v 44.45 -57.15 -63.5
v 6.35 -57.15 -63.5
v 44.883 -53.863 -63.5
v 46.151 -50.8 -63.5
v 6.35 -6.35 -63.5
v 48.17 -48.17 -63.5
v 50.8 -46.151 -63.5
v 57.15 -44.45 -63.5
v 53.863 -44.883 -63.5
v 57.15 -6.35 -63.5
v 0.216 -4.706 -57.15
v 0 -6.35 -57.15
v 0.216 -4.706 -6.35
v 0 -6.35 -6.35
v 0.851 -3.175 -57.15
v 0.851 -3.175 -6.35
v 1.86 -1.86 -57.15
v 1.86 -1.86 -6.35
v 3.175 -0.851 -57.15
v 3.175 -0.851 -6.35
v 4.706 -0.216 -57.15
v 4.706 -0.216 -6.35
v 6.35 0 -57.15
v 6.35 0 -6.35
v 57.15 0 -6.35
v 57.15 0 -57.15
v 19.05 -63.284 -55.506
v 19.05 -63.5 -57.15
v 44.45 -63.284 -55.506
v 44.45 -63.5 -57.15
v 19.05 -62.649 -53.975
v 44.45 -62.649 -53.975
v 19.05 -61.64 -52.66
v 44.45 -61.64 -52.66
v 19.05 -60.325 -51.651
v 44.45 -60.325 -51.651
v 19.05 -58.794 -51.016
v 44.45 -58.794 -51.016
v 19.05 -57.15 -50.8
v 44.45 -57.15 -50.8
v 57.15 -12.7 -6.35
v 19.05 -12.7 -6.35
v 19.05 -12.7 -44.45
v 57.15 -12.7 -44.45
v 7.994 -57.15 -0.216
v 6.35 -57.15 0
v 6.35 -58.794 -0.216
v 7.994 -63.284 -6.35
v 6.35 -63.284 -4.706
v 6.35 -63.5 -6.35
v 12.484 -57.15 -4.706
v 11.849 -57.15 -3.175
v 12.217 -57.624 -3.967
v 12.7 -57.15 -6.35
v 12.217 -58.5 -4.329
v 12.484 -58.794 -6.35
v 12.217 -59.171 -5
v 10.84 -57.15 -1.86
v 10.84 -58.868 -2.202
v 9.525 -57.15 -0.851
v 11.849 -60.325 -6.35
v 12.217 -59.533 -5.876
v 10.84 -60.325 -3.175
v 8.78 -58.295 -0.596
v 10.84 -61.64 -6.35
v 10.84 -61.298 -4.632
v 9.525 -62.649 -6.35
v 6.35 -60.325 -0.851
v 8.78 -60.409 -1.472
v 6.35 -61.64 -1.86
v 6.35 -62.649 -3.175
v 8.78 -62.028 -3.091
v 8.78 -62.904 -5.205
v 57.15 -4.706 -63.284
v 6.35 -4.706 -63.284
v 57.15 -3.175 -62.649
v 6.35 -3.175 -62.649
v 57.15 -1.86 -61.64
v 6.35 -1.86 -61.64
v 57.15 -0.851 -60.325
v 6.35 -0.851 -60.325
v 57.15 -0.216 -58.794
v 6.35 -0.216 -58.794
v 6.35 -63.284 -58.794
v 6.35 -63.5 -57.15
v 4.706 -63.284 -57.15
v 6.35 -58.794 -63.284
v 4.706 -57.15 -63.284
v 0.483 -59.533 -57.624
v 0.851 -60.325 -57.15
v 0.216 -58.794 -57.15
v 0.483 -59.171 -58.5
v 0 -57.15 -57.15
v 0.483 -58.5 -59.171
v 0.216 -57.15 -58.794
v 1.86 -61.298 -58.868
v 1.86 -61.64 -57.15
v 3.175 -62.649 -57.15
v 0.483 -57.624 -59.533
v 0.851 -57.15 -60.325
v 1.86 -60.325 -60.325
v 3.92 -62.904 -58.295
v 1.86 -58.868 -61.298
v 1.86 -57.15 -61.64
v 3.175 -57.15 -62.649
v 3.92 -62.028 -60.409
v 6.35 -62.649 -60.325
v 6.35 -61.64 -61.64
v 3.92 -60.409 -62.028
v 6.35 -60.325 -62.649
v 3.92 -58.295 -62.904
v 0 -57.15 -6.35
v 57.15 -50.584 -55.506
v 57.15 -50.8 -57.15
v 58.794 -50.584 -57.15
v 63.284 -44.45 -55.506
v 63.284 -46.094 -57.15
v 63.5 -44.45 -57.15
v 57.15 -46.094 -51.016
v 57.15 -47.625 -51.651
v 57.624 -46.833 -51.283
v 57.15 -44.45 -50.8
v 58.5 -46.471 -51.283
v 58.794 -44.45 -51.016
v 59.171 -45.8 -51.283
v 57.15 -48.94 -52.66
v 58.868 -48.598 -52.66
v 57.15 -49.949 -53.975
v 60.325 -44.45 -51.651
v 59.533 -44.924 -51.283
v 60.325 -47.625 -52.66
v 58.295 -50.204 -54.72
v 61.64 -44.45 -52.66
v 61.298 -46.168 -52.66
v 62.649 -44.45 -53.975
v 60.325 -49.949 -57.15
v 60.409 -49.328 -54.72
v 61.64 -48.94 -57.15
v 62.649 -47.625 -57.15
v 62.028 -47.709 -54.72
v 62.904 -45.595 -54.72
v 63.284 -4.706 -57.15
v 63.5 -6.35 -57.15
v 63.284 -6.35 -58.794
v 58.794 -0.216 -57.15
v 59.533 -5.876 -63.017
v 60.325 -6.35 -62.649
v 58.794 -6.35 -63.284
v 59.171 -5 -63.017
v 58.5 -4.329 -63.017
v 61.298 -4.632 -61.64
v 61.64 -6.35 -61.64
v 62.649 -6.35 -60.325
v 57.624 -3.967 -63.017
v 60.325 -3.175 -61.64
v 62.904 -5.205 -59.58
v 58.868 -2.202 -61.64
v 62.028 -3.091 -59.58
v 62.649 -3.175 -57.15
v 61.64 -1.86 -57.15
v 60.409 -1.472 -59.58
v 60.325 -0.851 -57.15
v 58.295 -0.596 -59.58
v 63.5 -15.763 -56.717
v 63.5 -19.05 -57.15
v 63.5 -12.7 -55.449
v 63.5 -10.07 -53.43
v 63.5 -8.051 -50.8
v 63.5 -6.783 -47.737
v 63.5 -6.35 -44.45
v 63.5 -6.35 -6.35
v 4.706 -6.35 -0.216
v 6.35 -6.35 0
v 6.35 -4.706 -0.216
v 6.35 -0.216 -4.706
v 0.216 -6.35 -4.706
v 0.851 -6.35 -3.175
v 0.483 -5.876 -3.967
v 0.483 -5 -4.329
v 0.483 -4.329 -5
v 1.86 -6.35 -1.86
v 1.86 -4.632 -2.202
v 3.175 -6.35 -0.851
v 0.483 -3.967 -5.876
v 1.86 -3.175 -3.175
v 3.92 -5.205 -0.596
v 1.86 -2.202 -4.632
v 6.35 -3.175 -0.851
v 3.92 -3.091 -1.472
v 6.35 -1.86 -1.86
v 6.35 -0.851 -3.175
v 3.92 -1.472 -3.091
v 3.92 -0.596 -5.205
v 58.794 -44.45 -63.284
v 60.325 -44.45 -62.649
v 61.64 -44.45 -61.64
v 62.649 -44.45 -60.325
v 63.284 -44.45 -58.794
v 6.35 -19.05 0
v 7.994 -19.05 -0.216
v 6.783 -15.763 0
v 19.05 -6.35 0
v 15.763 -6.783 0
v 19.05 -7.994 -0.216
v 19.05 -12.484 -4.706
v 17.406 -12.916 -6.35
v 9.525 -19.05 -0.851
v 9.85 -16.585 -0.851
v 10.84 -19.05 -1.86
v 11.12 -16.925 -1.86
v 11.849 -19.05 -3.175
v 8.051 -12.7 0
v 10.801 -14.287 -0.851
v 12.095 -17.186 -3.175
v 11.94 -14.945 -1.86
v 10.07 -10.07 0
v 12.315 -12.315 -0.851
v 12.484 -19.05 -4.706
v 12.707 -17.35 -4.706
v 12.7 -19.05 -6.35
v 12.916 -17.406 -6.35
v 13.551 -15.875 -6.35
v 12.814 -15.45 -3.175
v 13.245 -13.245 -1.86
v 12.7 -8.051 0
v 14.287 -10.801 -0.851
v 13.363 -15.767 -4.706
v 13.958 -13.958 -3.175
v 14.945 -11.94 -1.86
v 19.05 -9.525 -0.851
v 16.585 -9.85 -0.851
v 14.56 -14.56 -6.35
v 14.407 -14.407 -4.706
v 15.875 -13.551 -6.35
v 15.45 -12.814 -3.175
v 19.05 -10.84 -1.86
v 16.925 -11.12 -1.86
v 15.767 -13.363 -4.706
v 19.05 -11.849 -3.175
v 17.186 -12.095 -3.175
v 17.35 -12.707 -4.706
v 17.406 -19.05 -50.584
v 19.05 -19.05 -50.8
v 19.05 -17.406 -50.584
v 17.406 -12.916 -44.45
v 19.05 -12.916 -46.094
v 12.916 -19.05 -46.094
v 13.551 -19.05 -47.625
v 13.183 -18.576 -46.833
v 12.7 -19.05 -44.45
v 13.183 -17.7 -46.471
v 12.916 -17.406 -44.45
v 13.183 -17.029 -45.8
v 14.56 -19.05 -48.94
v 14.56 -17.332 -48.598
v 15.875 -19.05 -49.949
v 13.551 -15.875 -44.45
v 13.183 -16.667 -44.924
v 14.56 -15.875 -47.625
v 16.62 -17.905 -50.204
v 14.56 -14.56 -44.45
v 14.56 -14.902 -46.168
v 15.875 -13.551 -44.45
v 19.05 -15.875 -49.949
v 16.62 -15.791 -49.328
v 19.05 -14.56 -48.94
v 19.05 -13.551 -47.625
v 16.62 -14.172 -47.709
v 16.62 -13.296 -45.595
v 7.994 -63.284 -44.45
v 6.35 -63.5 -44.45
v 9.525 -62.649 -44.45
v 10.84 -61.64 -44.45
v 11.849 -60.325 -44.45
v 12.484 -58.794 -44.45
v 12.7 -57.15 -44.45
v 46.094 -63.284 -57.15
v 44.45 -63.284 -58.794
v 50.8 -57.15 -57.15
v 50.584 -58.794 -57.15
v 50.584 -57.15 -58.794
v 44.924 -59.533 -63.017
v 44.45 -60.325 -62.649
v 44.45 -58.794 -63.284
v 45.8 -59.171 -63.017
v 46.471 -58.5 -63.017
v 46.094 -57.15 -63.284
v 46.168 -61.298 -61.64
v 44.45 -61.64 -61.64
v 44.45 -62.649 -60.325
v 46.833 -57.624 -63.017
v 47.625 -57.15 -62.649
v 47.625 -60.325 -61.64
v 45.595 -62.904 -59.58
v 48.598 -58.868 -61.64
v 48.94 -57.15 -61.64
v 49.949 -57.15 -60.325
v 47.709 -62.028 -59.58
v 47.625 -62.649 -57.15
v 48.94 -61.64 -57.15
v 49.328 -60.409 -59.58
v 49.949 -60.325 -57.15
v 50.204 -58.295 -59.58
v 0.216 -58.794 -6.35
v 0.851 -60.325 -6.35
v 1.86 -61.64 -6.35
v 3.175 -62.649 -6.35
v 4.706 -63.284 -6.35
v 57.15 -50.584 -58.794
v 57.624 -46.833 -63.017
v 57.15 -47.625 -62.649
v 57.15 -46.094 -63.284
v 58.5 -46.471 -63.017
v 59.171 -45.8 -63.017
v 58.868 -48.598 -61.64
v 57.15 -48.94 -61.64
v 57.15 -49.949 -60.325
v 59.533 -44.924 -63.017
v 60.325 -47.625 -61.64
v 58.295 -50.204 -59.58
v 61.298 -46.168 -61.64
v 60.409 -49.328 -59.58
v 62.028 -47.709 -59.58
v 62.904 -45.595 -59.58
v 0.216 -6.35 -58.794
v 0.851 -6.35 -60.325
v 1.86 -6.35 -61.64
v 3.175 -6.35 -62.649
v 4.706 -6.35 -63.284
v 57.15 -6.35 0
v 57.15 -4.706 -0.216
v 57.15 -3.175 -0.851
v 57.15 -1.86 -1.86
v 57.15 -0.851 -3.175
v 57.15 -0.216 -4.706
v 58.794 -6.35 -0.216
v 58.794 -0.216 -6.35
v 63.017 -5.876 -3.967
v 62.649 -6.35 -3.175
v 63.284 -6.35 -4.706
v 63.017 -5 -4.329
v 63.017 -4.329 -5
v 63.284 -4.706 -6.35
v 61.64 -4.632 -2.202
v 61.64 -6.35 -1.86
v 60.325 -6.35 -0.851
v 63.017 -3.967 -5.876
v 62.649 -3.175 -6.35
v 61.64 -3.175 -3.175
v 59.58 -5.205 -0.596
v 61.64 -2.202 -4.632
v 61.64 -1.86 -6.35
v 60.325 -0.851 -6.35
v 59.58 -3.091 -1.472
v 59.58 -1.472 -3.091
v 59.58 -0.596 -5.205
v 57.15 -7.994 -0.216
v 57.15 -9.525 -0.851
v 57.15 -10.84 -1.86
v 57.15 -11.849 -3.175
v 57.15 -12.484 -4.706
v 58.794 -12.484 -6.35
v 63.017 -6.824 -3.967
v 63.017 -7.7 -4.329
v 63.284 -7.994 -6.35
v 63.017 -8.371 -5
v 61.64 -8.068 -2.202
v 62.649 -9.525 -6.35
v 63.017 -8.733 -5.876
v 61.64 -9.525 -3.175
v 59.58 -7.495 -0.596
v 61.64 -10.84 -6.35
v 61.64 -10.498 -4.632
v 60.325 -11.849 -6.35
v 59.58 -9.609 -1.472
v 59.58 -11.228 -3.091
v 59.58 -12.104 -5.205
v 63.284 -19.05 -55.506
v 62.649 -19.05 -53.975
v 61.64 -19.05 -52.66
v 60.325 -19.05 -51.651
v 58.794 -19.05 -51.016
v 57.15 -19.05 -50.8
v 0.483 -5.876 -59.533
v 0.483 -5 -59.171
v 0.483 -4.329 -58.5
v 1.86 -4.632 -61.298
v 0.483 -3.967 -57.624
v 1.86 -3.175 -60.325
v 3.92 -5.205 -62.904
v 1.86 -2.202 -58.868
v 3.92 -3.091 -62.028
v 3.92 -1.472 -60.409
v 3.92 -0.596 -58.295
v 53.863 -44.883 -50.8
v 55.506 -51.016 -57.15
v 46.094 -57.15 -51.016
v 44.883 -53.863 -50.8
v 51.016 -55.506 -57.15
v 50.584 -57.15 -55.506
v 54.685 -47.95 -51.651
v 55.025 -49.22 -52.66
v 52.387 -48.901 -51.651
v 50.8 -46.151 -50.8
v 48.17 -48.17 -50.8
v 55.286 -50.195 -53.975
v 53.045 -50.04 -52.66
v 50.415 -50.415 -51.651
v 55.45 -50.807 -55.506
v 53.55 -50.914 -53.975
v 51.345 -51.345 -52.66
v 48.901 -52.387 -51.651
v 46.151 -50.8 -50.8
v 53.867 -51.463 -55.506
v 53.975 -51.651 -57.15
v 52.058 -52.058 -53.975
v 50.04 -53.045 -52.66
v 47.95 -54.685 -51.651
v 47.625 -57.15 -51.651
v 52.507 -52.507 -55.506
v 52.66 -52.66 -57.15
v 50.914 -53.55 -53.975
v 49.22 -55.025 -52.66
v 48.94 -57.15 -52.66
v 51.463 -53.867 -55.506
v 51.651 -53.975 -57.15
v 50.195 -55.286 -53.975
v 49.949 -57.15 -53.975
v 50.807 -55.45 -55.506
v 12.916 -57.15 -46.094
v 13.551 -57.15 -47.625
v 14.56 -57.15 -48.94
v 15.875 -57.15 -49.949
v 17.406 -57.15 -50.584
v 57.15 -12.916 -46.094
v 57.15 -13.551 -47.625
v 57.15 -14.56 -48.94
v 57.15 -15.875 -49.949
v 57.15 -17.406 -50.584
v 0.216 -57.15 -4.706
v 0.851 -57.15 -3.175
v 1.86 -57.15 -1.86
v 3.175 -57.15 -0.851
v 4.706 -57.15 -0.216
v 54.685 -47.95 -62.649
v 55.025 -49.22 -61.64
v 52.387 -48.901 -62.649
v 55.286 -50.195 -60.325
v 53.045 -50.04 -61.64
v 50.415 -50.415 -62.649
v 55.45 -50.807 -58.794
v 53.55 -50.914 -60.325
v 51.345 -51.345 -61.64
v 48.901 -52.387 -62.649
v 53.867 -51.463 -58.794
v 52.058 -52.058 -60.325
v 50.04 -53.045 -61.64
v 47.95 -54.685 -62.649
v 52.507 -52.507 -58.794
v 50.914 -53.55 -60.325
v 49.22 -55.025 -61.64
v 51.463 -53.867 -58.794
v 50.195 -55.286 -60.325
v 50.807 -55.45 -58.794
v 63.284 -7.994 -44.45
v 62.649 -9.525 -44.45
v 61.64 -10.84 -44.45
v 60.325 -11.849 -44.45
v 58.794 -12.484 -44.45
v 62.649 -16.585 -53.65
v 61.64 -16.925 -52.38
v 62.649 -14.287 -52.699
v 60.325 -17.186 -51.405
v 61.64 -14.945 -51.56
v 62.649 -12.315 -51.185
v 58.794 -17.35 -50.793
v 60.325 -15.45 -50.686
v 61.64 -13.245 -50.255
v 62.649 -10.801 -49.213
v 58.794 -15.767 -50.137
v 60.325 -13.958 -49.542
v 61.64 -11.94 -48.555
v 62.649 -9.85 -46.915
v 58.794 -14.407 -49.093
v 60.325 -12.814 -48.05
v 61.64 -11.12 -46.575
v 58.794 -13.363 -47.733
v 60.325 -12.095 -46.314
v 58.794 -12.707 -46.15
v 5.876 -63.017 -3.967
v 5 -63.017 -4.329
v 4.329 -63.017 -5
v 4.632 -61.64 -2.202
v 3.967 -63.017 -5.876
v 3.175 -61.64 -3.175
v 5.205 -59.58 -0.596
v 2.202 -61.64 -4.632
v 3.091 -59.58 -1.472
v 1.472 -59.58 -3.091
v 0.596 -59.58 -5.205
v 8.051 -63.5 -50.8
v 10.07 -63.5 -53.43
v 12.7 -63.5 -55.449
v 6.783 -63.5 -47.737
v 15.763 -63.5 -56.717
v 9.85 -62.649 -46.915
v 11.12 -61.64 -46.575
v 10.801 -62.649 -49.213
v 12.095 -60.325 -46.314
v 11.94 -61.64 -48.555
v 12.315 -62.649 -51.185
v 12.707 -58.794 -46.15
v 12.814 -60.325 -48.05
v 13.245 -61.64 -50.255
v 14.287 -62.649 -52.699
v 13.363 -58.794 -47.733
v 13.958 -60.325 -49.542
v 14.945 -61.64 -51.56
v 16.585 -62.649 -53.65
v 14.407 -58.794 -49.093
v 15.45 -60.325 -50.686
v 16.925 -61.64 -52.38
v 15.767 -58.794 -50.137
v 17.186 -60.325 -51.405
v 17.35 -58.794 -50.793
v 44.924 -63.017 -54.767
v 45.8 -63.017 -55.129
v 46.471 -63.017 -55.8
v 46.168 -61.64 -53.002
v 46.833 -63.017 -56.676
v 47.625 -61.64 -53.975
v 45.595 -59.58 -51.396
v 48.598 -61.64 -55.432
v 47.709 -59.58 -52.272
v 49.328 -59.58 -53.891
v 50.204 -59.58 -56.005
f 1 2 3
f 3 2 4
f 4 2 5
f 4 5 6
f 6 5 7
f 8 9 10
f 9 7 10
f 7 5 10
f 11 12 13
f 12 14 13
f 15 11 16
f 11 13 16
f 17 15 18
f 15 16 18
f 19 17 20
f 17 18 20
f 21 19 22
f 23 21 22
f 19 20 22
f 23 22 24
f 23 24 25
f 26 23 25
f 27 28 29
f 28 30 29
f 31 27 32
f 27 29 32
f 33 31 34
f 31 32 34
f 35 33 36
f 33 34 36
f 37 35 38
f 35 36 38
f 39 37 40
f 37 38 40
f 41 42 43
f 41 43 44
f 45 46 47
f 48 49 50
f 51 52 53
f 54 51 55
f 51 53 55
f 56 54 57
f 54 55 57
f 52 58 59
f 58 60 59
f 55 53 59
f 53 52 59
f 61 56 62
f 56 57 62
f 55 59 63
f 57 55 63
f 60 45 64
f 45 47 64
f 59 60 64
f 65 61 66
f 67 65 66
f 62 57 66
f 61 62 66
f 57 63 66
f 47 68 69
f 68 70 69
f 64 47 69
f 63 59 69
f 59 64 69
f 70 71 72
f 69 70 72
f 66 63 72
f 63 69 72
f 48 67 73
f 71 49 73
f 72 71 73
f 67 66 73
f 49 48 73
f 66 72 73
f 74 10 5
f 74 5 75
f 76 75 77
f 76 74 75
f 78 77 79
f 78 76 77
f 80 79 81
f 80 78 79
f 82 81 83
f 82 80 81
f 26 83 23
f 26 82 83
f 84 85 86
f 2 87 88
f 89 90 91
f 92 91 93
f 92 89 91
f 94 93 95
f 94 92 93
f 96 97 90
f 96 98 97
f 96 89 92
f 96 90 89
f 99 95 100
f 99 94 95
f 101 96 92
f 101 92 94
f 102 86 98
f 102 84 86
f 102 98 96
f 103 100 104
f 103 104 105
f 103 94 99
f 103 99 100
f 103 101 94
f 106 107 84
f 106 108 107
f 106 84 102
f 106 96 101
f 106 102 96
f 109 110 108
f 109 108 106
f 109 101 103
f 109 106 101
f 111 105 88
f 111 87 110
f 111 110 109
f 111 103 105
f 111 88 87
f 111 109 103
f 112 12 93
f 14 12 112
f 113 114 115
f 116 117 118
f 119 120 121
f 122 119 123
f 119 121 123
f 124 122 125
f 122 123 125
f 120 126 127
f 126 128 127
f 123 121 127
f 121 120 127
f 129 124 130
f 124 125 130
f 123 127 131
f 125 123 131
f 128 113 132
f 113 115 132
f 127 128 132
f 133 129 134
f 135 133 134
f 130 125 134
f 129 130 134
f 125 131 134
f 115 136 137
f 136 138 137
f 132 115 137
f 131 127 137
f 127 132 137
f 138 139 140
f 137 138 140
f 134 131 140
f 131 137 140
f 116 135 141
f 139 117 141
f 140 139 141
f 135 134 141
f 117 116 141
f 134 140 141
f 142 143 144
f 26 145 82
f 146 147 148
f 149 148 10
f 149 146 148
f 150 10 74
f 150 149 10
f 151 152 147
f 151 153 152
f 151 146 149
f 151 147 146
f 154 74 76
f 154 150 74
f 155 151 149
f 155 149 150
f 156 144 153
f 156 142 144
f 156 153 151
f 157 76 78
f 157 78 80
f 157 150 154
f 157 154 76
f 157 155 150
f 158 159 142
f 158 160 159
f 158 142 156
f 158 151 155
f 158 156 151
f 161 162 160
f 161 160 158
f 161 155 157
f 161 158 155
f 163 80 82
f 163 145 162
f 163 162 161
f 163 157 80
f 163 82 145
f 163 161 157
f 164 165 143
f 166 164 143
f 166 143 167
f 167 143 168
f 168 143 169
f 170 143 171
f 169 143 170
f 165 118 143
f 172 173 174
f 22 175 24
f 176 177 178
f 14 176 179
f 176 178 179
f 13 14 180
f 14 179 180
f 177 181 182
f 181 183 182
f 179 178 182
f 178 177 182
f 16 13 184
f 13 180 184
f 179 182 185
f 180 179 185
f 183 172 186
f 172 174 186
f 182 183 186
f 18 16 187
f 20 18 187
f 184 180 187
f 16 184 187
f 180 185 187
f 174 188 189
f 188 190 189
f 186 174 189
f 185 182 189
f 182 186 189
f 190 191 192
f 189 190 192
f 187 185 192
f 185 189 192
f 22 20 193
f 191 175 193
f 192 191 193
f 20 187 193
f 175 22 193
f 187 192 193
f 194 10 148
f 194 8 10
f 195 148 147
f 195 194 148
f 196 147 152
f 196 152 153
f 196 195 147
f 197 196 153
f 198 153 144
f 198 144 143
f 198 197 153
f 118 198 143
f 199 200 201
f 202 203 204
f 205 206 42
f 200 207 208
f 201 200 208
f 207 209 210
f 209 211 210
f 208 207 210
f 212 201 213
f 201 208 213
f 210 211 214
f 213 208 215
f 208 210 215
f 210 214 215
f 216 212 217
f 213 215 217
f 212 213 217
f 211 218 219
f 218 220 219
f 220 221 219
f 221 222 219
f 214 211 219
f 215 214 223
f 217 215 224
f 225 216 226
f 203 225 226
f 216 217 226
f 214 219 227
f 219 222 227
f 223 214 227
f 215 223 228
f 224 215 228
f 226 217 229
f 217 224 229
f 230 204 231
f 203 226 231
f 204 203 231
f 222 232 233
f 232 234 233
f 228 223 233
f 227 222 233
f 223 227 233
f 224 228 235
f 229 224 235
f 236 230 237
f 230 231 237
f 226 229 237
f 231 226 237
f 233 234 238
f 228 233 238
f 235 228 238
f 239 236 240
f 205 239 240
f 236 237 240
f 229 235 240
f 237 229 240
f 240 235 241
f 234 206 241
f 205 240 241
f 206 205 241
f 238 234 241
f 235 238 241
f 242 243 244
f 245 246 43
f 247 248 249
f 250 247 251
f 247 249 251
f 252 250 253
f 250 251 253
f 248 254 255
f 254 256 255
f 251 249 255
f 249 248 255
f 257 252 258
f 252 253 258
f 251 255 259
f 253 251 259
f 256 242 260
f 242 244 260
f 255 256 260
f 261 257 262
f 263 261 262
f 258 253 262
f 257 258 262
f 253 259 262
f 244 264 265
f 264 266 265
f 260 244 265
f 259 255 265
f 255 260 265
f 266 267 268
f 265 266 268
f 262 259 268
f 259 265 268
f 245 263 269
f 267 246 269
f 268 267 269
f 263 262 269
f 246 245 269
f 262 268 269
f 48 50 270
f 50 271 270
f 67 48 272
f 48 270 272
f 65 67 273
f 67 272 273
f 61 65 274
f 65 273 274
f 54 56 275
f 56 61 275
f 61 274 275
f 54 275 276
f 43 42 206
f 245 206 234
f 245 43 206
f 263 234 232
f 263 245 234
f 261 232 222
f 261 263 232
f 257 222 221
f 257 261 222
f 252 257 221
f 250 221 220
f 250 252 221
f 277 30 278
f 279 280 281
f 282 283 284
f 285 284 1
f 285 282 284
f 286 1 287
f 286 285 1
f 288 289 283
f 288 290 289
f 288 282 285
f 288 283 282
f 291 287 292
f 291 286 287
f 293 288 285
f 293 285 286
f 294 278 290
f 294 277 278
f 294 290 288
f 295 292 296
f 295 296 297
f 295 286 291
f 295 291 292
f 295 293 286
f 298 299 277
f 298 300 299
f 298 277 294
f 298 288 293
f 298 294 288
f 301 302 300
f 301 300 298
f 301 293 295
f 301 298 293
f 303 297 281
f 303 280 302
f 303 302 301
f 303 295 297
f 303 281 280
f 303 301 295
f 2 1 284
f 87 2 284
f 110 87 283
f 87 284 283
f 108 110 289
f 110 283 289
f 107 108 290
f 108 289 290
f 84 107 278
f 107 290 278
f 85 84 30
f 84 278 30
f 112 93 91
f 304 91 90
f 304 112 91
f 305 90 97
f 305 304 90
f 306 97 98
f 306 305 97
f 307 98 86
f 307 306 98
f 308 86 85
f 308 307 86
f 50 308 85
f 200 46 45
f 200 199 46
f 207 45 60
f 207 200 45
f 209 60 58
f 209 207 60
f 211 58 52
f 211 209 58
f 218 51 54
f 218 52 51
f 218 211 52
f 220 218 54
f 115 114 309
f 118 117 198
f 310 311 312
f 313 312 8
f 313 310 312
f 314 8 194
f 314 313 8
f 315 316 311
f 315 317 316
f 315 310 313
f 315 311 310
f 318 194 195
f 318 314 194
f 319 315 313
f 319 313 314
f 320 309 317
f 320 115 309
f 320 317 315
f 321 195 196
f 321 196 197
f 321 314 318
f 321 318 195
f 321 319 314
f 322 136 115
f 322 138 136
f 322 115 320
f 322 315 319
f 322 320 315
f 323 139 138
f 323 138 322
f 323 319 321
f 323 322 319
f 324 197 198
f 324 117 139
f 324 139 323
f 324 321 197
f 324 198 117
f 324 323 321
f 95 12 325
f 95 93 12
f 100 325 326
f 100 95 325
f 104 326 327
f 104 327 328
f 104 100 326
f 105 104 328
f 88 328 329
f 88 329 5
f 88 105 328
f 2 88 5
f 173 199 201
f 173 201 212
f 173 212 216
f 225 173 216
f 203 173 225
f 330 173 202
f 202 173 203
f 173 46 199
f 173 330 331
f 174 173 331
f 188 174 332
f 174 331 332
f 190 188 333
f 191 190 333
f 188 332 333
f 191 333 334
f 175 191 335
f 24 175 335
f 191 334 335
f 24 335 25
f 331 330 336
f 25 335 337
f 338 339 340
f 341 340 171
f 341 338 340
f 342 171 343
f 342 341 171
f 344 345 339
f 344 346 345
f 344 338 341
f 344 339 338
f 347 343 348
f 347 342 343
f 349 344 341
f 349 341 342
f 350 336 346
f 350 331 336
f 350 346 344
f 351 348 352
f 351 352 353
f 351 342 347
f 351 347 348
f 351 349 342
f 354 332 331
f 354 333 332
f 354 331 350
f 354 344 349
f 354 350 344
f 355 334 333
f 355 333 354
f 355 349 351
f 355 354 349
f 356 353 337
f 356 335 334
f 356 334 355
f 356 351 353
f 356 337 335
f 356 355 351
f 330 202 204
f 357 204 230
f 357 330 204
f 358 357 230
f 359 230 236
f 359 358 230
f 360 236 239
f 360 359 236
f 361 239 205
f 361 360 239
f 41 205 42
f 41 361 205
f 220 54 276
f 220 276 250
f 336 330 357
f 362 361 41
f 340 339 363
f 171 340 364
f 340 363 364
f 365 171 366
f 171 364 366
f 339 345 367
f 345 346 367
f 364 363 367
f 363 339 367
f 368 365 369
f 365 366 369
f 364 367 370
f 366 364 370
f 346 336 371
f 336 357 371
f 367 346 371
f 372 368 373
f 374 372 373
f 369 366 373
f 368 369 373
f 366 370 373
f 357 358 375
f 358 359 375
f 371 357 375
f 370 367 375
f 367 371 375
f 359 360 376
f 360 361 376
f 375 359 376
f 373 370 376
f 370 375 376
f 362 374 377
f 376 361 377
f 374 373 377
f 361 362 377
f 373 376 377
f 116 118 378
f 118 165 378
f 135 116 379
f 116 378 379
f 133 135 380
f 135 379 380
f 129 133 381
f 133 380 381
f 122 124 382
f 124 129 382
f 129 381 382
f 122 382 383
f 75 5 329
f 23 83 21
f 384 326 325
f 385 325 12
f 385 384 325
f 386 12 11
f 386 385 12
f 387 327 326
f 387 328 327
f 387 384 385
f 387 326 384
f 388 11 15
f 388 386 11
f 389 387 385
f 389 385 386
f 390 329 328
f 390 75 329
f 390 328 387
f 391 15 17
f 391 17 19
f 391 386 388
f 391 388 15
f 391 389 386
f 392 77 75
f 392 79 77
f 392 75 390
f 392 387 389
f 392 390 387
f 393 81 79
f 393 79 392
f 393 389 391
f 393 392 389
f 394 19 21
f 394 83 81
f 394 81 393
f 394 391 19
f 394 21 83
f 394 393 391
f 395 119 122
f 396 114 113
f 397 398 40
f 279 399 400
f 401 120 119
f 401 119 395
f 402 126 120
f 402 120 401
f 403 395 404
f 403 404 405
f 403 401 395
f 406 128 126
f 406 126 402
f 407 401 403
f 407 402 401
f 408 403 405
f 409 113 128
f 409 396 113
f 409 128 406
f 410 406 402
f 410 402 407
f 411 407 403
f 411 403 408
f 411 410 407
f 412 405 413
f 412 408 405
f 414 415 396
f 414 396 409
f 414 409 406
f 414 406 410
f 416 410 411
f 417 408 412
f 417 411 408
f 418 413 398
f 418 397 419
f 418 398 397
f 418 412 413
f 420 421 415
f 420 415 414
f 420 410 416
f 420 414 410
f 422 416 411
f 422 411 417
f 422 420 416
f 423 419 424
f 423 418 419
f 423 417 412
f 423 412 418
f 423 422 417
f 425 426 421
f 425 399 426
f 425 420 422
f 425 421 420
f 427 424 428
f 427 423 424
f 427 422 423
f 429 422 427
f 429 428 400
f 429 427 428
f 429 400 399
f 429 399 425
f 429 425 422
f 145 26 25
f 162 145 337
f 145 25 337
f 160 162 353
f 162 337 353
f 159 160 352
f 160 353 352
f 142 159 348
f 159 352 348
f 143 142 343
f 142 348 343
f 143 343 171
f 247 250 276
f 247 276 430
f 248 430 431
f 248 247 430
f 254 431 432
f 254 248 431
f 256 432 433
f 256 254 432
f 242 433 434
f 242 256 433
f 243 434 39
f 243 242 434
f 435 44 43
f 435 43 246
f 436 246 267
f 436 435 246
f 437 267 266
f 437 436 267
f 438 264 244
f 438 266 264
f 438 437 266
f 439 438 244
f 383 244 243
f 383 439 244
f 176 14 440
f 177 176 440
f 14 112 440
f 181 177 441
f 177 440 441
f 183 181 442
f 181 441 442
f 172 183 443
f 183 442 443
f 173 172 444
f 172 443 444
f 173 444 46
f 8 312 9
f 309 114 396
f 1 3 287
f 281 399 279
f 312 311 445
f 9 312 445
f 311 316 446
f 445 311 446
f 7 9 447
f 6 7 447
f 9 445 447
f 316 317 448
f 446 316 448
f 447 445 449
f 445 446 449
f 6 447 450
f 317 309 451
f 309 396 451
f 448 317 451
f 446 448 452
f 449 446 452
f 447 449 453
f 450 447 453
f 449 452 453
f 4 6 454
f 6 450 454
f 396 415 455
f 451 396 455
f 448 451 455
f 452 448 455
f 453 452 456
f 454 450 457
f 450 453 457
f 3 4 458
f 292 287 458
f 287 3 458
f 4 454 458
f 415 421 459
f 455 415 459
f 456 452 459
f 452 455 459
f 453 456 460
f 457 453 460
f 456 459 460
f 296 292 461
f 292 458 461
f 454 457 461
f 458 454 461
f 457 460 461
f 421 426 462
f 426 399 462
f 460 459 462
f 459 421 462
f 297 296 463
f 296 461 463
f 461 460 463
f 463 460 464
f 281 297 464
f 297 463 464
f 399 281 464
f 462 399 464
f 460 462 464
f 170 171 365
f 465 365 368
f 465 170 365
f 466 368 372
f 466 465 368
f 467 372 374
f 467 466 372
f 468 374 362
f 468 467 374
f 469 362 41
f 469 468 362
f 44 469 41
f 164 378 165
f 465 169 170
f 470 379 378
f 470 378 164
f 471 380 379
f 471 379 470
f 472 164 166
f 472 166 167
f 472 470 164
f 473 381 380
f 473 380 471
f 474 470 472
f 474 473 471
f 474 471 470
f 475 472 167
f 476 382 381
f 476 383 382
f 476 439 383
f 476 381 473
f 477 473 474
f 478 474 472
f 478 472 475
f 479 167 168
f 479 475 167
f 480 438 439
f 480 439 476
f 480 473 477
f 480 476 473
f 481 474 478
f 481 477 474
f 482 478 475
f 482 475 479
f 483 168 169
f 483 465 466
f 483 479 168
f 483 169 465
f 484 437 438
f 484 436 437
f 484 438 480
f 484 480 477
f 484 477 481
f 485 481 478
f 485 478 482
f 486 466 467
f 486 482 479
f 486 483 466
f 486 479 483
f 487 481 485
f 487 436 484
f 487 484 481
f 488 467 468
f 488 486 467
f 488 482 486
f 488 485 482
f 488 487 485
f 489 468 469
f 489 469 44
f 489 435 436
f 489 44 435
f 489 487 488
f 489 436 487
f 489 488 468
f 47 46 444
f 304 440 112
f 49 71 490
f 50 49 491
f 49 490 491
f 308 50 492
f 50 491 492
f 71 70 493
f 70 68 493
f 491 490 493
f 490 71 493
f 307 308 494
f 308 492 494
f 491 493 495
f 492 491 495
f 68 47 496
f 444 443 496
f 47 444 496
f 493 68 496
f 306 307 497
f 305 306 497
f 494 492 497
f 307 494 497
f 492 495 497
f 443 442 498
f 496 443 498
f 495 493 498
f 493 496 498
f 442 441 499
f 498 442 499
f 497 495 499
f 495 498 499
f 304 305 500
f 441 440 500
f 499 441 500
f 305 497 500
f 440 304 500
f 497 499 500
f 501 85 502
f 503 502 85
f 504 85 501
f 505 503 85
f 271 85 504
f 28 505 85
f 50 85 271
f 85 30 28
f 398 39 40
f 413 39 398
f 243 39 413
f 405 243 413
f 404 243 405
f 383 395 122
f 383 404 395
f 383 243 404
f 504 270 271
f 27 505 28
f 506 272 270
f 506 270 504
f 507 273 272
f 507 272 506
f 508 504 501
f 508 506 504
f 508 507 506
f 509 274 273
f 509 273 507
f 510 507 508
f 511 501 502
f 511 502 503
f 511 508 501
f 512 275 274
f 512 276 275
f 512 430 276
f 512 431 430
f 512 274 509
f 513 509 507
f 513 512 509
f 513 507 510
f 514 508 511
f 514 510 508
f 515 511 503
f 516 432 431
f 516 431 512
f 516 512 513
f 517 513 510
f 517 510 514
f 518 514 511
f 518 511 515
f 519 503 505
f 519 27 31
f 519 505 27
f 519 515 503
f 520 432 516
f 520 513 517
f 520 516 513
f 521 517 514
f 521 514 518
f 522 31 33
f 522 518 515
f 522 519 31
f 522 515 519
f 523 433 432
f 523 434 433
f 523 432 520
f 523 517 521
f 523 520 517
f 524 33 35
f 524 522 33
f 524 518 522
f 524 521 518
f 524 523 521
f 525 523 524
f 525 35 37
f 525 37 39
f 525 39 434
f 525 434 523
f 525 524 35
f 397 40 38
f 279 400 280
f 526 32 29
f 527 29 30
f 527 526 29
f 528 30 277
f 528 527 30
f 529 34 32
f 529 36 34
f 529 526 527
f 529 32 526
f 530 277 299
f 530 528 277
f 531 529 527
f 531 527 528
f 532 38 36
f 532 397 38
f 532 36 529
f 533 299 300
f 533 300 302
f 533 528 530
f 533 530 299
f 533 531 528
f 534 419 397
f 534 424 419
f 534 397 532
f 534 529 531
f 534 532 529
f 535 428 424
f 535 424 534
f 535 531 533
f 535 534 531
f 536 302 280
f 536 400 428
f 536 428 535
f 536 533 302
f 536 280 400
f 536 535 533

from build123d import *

# Parameters (mm, degrees)
F0_W     = 63.5
F0_H     = 63.5
F1_DEPTH = 63.5
F2_W     = 50.8
F2_H     = 50.8
F3_DEPTH = 50.8
F4_W     = 12.7
F4_H     = 12.7
F5_DEPTH = 12.7
F6_R     = 6.34999


# Not quite as in the source:
# - a fillet or chamfer is up to 0.001 mm smaller than in the source, because OpenCascade refuses the exact size


with BuildPart() as f1:
    # F0 (on Front) → F1 (new body)
    with BuildSketch(Plane.XZ):
        with Locations((31.75, -31.75)):
            Rectangle(F0_W, F0_H)
    extrude(amount=F1_DEPTH)

    # F2 (on face) → F3 (cut)
    with BuildSketch(Plane.XY):
        with Locations((38.1, -38.1)):
            Rectangle(F2_W, F2_H)
    extrude(amount=-F3_DEPTH, mode=Mode.SUBTRACT)

    # F4 (on face) → F5 (cut)
    with BuildSketch(Plane.XY.offset(-50.8)):
        with Locations((57.15, -57.15)):
            Rectangle(F4_W, F4_H)
    extrude(amount=-F5_DEPTH, mode=Mode.SUBTRACT)

    # F6 (radius 6.35 in the source; OpenCascade refuses exactly that, so slightly less here)
    f6_edges = [f1.edges().sort_by_distance(p)[0] for p in [
        (31.75, 0, 0),
        (0, -31.75, 0),
        (6.35, -63.5, 0),
        (12.7, -38.1, 0),
        (38.1, -12.7, 0),
        (63.5, -6.35, 0),
        (63.5, -50.8, -57.15),
        (50.8, -50.8, -57.15),
        (57.15, -50.8, -50.8),
        (57.15, -50.8, -63.5),
        (38.1, -12.7, -50.8),
        (63.5, -31.75, -50.8),
        (50.8, -57.15, -50.8),
        (31.75, -63.5, -50.8),
        (12.7, -38.1, -50.8),
        (63.5, 0, -31.75),
        (63.5, -12.7, -25.4),
        (63.5, -25.4, -63.5),
        (12.7, -63.5, -25.4),
        (50.8, -63.5, -57.15),
        (25.4, -63.5, -63.5),
        (0, -63.5, -31.75),
        (50.8, -57.15, -63.5),
        (31.75, 0, -63.5),
        (0, -31.75, -63.5),
        (12.7, -12.7, -25.4),
        (0, 0, -31.75),
    ]]
    fillet(f6_edges, radius=F6_R)


solid = f1.part
